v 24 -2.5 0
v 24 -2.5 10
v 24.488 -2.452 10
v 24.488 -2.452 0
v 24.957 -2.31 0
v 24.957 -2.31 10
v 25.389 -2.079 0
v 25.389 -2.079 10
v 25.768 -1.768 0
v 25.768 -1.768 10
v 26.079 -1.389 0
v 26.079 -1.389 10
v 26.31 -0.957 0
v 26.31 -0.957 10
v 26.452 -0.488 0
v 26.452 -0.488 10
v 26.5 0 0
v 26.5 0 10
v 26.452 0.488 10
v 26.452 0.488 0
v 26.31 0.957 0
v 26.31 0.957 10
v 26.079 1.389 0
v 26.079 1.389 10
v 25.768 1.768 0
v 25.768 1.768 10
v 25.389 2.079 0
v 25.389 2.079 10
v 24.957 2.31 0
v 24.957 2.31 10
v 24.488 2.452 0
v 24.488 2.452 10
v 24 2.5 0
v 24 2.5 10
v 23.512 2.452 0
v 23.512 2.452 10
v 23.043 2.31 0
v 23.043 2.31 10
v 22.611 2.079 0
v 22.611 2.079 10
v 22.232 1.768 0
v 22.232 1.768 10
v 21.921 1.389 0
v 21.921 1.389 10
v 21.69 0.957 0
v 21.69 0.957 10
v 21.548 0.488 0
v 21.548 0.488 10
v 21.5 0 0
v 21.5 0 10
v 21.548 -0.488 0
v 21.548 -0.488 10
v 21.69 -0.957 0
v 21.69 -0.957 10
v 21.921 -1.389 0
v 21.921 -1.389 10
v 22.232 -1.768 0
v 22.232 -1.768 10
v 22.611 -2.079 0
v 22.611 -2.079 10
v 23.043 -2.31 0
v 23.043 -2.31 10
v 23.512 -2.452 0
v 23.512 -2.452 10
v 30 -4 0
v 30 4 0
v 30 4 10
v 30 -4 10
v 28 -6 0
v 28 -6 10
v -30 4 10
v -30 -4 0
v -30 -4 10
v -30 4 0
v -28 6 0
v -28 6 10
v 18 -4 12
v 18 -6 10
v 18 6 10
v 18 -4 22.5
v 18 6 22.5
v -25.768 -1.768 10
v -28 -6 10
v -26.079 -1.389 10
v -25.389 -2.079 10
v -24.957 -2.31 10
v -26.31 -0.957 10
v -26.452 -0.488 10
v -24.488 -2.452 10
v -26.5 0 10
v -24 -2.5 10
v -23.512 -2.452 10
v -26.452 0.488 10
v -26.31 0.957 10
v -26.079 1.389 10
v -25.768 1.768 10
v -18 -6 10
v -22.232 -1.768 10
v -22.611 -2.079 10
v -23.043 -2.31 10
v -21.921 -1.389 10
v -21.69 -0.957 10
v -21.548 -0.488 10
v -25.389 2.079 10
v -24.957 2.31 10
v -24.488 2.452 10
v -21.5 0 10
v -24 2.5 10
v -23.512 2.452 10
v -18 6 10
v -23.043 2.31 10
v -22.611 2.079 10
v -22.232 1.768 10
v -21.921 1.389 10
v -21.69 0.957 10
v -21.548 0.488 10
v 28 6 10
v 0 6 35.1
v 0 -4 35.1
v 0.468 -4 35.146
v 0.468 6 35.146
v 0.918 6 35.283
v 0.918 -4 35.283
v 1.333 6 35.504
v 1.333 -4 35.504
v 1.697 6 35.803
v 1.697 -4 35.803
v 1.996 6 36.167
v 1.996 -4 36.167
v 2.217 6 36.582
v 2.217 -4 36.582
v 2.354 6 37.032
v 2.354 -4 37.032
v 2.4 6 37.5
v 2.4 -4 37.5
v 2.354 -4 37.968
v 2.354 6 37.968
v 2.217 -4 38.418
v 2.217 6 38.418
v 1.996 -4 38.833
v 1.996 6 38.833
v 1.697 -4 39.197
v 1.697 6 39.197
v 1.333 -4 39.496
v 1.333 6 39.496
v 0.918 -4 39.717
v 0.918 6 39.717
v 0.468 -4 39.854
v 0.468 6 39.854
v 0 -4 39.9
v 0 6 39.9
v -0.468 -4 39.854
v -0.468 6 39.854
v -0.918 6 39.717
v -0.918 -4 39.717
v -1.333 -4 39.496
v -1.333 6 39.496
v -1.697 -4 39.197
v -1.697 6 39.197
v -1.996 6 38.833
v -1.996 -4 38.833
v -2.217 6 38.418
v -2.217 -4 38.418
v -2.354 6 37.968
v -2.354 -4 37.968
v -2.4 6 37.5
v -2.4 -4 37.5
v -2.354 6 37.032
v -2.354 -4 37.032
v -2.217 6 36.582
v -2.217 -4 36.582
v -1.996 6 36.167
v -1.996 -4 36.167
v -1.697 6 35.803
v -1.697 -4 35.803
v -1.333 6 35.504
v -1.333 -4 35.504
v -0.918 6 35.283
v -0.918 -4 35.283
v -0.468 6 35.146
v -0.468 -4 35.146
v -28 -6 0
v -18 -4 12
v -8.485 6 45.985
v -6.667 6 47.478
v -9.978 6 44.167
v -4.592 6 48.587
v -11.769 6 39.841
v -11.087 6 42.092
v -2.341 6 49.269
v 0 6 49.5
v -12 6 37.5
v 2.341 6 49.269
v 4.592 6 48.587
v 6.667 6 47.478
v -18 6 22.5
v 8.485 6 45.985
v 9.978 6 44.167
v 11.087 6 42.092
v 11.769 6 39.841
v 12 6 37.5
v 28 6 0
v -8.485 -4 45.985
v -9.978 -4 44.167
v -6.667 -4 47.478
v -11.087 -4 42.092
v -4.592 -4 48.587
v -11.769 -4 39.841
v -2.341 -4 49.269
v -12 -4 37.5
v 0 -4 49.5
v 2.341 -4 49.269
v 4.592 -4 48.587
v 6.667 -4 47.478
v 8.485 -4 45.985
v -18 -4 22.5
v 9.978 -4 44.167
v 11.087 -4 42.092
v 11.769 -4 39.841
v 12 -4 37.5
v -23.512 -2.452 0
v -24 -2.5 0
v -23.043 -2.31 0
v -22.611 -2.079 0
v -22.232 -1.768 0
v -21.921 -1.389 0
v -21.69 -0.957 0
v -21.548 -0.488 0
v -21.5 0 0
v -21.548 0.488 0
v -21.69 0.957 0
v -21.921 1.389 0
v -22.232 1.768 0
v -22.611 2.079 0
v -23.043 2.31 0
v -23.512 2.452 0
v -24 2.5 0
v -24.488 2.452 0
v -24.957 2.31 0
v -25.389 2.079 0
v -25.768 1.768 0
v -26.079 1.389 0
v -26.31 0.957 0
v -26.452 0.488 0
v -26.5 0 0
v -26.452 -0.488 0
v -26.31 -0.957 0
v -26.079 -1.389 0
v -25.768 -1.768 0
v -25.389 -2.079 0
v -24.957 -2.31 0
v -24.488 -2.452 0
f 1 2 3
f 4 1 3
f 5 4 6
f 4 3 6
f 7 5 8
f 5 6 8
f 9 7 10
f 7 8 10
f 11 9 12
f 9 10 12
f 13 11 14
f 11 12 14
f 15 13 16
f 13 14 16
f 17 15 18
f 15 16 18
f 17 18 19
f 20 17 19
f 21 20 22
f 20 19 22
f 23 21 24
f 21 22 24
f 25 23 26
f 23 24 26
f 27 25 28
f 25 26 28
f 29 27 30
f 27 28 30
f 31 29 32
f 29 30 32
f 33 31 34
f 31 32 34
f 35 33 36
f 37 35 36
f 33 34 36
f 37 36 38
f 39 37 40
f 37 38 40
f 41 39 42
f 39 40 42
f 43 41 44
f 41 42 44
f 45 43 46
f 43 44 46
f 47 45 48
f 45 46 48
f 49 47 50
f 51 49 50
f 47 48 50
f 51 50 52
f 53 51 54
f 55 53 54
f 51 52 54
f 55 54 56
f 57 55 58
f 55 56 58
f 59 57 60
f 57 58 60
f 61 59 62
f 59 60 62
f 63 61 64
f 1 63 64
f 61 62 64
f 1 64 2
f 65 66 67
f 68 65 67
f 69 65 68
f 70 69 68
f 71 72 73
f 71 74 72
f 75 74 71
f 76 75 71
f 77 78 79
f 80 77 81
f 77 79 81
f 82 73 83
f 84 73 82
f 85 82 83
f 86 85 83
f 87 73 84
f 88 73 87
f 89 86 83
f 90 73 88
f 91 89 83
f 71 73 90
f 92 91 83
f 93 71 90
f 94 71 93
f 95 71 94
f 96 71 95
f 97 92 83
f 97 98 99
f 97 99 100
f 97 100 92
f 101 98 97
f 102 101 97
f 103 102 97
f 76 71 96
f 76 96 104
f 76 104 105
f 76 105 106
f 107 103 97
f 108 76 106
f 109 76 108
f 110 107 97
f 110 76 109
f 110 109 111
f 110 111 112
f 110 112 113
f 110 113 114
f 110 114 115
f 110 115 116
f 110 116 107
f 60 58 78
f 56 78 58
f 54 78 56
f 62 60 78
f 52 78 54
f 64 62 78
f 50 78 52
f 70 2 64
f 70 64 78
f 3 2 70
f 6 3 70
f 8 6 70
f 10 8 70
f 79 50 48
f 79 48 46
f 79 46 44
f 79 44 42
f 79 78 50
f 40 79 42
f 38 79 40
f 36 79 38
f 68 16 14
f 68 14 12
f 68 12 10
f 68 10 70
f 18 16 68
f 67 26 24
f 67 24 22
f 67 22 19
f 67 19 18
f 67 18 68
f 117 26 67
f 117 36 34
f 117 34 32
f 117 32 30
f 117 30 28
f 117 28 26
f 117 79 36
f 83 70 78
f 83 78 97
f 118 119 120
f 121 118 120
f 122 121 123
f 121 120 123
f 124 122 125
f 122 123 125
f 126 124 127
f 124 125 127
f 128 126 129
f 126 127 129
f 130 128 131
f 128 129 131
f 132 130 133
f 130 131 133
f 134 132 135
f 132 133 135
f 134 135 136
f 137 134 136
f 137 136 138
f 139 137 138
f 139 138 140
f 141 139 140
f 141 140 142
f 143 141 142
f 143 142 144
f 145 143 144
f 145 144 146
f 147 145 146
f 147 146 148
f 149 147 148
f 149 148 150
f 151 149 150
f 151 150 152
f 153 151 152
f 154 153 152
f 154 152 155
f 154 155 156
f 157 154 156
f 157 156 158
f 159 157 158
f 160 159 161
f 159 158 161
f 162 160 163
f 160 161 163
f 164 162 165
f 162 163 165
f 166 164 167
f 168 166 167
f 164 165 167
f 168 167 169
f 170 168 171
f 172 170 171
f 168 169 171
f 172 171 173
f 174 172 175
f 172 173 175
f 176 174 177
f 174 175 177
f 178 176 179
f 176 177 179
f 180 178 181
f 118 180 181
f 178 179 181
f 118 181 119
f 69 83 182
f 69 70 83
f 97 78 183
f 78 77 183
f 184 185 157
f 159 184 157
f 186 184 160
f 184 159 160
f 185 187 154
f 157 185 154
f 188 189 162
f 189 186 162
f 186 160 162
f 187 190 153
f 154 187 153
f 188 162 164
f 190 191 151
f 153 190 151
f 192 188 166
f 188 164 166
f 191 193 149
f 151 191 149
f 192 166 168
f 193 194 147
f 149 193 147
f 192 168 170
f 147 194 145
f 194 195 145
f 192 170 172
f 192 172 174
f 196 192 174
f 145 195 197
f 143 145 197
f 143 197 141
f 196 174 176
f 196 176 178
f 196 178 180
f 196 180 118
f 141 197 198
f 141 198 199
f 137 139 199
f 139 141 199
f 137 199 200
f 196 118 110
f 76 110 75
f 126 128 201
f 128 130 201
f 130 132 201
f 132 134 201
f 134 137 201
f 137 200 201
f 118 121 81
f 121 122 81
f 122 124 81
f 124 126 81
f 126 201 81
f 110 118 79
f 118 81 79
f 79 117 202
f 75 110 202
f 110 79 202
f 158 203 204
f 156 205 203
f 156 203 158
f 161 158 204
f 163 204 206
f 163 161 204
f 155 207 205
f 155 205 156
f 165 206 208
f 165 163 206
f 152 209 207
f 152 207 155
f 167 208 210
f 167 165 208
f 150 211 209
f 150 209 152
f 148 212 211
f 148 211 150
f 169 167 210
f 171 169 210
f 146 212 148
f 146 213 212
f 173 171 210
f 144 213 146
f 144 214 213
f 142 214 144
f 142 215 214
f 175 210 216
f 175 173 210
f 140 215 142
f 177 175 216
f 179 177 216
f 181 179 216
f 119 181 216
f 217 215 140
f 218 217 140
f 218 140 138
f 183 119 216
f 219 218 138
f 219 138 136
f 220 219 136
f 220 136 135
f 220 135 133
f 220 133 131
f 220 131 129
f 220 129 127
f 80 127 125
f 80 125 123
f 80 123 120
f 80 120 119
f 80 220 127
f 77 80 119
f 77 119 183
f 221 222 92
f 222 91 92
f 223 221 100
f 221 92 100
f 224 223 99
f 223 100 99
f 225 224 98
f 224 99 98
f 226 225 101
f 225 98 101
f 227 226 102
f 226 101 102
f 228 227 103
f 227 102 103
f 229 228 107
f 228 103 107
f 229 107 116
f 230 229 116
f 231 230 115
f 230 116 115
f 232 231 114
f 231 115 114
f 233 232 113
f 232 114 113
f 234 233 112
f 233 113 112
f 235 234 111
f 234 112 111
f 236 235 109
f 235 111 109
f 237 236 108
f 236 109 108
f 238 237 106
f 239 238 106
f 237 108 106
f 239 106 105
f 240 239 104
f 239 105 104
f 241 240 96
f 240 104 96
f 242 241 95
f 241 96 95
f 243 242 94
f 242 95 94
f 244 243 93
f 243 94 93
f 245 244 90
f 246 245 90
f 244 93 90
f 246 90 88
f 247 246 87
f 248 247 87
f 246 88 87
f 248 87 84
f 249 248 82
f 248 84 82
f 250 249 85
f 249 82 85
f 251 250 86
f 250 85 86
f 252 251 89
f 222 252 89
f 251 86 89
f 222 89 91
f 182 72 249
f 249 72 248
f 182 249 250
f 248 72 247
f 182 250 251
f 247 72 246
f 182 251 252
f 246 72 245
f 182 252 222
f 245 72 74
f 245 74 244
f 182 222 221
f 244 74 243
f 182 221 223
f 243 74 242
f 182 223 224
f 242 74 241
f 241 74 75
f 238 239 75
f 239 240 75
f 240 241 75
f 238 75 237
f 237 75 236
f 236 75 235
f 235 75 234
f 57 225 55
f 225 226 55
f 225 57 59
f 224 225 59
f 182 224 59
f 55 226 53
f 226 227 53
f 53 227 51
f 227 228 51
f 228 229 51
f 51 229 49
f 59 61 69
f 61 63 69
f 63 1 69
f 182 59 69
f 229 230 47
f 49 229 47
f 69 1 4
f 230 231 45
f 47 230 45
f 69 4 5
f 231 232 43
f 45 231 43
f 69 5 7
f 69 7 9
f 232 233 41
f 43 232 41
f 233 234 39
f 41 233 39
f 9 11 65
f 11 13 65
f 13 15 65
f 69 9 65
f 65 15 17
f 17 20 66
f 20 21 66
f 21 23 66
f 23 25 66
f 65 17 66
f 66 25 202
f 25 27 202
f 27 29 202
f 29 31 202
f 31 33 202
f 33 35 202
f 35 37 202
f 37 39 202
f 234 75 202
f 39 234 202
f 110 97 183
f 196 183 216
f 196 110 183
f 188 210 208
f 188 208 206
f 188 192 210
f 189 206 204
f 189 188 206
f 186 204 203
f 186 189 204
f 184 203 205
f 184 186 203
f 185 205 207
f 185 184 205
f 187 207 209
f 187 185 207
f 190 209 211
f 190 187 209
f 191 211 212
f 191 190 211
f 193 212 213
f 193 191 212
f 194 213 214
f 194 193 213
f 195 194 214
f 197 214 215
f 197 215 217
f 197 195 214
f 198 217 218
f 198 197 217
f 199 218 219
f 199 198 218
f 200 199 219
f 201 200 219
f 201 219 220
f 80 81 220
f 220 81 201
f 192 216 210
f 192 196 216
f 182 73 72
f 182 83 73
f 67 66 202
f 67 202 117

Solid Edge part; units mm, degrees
sketch "Sketch1" plane through (0, 0, 0) normal (0, -1, 0) x (1, 0, 0)
  line L0 (-30, 0) -> (30, 0)
  line L1 (30, 0) -> (30, 10)
  line L2 (30, 10) -> (18, 10)
  line L3 (18, 10) -> (18, 22.5)
  line L4 (18, 22.5) -> (12, 37.5)
  arc A0 (-12, 37.5) -> (12, 37.5) centre (0, 37.5) cw
  line L5 (-18, 22.5) -> (-12, 37.5)
  line L6 (-18, 10) -> (-18, 22.5)
  line L7 (-30, 10) -> (-18, 10)
  line L8 (-30, 0) -> (-30, 10)
  dimension "D1" = 60
  dimension "D2" = 10
  dimension "D3" = 12
  dimension "D4" = 12.5
  dimension "D5" = 12
  dimension "D6" = 15
extrude "Protrusion1" add sketch "Sketch1" along normal mid plane 12
hole "Hole_1" at (-24, 0, 10) direction (0, 0, -1) diameter 5 end up to next
hole "Hole1" at (24, 0, 10) direction (0, 0, -1) diameter 5 end up to next
sketch "Sketch2" plane through (0, -6, 21.25) normal (0, -1, 0) x (1, 0, 0)
  line L0 (-18, -11.25) -> (18, -11.25)
  line L1 (18, -11.25) -> (18, 28.25)
  line L2 (18, 28.25) -> (-18, 28.25)
  line L3 (-18, 28.25) -> (-18, -11.25)
extrude "ExtrudedCutout_1" cut sketch "Sketch2" against normal blind 2
chamfer "Chamfer_1" distance 2 angle 45 1 edges at (0, -4, 10)
chamfer "Chamfer_2" distance 2 angle 45 4 edges at (30, -6, 5) (30, 6, 5) (-30, -6, 5) (-30, 6, 5)
hole "Hole_3" at (0, -4, 37.5) direction (0, 1, 0) diameter 4.8 end up to next
properties material "Polyethylene, low density"
